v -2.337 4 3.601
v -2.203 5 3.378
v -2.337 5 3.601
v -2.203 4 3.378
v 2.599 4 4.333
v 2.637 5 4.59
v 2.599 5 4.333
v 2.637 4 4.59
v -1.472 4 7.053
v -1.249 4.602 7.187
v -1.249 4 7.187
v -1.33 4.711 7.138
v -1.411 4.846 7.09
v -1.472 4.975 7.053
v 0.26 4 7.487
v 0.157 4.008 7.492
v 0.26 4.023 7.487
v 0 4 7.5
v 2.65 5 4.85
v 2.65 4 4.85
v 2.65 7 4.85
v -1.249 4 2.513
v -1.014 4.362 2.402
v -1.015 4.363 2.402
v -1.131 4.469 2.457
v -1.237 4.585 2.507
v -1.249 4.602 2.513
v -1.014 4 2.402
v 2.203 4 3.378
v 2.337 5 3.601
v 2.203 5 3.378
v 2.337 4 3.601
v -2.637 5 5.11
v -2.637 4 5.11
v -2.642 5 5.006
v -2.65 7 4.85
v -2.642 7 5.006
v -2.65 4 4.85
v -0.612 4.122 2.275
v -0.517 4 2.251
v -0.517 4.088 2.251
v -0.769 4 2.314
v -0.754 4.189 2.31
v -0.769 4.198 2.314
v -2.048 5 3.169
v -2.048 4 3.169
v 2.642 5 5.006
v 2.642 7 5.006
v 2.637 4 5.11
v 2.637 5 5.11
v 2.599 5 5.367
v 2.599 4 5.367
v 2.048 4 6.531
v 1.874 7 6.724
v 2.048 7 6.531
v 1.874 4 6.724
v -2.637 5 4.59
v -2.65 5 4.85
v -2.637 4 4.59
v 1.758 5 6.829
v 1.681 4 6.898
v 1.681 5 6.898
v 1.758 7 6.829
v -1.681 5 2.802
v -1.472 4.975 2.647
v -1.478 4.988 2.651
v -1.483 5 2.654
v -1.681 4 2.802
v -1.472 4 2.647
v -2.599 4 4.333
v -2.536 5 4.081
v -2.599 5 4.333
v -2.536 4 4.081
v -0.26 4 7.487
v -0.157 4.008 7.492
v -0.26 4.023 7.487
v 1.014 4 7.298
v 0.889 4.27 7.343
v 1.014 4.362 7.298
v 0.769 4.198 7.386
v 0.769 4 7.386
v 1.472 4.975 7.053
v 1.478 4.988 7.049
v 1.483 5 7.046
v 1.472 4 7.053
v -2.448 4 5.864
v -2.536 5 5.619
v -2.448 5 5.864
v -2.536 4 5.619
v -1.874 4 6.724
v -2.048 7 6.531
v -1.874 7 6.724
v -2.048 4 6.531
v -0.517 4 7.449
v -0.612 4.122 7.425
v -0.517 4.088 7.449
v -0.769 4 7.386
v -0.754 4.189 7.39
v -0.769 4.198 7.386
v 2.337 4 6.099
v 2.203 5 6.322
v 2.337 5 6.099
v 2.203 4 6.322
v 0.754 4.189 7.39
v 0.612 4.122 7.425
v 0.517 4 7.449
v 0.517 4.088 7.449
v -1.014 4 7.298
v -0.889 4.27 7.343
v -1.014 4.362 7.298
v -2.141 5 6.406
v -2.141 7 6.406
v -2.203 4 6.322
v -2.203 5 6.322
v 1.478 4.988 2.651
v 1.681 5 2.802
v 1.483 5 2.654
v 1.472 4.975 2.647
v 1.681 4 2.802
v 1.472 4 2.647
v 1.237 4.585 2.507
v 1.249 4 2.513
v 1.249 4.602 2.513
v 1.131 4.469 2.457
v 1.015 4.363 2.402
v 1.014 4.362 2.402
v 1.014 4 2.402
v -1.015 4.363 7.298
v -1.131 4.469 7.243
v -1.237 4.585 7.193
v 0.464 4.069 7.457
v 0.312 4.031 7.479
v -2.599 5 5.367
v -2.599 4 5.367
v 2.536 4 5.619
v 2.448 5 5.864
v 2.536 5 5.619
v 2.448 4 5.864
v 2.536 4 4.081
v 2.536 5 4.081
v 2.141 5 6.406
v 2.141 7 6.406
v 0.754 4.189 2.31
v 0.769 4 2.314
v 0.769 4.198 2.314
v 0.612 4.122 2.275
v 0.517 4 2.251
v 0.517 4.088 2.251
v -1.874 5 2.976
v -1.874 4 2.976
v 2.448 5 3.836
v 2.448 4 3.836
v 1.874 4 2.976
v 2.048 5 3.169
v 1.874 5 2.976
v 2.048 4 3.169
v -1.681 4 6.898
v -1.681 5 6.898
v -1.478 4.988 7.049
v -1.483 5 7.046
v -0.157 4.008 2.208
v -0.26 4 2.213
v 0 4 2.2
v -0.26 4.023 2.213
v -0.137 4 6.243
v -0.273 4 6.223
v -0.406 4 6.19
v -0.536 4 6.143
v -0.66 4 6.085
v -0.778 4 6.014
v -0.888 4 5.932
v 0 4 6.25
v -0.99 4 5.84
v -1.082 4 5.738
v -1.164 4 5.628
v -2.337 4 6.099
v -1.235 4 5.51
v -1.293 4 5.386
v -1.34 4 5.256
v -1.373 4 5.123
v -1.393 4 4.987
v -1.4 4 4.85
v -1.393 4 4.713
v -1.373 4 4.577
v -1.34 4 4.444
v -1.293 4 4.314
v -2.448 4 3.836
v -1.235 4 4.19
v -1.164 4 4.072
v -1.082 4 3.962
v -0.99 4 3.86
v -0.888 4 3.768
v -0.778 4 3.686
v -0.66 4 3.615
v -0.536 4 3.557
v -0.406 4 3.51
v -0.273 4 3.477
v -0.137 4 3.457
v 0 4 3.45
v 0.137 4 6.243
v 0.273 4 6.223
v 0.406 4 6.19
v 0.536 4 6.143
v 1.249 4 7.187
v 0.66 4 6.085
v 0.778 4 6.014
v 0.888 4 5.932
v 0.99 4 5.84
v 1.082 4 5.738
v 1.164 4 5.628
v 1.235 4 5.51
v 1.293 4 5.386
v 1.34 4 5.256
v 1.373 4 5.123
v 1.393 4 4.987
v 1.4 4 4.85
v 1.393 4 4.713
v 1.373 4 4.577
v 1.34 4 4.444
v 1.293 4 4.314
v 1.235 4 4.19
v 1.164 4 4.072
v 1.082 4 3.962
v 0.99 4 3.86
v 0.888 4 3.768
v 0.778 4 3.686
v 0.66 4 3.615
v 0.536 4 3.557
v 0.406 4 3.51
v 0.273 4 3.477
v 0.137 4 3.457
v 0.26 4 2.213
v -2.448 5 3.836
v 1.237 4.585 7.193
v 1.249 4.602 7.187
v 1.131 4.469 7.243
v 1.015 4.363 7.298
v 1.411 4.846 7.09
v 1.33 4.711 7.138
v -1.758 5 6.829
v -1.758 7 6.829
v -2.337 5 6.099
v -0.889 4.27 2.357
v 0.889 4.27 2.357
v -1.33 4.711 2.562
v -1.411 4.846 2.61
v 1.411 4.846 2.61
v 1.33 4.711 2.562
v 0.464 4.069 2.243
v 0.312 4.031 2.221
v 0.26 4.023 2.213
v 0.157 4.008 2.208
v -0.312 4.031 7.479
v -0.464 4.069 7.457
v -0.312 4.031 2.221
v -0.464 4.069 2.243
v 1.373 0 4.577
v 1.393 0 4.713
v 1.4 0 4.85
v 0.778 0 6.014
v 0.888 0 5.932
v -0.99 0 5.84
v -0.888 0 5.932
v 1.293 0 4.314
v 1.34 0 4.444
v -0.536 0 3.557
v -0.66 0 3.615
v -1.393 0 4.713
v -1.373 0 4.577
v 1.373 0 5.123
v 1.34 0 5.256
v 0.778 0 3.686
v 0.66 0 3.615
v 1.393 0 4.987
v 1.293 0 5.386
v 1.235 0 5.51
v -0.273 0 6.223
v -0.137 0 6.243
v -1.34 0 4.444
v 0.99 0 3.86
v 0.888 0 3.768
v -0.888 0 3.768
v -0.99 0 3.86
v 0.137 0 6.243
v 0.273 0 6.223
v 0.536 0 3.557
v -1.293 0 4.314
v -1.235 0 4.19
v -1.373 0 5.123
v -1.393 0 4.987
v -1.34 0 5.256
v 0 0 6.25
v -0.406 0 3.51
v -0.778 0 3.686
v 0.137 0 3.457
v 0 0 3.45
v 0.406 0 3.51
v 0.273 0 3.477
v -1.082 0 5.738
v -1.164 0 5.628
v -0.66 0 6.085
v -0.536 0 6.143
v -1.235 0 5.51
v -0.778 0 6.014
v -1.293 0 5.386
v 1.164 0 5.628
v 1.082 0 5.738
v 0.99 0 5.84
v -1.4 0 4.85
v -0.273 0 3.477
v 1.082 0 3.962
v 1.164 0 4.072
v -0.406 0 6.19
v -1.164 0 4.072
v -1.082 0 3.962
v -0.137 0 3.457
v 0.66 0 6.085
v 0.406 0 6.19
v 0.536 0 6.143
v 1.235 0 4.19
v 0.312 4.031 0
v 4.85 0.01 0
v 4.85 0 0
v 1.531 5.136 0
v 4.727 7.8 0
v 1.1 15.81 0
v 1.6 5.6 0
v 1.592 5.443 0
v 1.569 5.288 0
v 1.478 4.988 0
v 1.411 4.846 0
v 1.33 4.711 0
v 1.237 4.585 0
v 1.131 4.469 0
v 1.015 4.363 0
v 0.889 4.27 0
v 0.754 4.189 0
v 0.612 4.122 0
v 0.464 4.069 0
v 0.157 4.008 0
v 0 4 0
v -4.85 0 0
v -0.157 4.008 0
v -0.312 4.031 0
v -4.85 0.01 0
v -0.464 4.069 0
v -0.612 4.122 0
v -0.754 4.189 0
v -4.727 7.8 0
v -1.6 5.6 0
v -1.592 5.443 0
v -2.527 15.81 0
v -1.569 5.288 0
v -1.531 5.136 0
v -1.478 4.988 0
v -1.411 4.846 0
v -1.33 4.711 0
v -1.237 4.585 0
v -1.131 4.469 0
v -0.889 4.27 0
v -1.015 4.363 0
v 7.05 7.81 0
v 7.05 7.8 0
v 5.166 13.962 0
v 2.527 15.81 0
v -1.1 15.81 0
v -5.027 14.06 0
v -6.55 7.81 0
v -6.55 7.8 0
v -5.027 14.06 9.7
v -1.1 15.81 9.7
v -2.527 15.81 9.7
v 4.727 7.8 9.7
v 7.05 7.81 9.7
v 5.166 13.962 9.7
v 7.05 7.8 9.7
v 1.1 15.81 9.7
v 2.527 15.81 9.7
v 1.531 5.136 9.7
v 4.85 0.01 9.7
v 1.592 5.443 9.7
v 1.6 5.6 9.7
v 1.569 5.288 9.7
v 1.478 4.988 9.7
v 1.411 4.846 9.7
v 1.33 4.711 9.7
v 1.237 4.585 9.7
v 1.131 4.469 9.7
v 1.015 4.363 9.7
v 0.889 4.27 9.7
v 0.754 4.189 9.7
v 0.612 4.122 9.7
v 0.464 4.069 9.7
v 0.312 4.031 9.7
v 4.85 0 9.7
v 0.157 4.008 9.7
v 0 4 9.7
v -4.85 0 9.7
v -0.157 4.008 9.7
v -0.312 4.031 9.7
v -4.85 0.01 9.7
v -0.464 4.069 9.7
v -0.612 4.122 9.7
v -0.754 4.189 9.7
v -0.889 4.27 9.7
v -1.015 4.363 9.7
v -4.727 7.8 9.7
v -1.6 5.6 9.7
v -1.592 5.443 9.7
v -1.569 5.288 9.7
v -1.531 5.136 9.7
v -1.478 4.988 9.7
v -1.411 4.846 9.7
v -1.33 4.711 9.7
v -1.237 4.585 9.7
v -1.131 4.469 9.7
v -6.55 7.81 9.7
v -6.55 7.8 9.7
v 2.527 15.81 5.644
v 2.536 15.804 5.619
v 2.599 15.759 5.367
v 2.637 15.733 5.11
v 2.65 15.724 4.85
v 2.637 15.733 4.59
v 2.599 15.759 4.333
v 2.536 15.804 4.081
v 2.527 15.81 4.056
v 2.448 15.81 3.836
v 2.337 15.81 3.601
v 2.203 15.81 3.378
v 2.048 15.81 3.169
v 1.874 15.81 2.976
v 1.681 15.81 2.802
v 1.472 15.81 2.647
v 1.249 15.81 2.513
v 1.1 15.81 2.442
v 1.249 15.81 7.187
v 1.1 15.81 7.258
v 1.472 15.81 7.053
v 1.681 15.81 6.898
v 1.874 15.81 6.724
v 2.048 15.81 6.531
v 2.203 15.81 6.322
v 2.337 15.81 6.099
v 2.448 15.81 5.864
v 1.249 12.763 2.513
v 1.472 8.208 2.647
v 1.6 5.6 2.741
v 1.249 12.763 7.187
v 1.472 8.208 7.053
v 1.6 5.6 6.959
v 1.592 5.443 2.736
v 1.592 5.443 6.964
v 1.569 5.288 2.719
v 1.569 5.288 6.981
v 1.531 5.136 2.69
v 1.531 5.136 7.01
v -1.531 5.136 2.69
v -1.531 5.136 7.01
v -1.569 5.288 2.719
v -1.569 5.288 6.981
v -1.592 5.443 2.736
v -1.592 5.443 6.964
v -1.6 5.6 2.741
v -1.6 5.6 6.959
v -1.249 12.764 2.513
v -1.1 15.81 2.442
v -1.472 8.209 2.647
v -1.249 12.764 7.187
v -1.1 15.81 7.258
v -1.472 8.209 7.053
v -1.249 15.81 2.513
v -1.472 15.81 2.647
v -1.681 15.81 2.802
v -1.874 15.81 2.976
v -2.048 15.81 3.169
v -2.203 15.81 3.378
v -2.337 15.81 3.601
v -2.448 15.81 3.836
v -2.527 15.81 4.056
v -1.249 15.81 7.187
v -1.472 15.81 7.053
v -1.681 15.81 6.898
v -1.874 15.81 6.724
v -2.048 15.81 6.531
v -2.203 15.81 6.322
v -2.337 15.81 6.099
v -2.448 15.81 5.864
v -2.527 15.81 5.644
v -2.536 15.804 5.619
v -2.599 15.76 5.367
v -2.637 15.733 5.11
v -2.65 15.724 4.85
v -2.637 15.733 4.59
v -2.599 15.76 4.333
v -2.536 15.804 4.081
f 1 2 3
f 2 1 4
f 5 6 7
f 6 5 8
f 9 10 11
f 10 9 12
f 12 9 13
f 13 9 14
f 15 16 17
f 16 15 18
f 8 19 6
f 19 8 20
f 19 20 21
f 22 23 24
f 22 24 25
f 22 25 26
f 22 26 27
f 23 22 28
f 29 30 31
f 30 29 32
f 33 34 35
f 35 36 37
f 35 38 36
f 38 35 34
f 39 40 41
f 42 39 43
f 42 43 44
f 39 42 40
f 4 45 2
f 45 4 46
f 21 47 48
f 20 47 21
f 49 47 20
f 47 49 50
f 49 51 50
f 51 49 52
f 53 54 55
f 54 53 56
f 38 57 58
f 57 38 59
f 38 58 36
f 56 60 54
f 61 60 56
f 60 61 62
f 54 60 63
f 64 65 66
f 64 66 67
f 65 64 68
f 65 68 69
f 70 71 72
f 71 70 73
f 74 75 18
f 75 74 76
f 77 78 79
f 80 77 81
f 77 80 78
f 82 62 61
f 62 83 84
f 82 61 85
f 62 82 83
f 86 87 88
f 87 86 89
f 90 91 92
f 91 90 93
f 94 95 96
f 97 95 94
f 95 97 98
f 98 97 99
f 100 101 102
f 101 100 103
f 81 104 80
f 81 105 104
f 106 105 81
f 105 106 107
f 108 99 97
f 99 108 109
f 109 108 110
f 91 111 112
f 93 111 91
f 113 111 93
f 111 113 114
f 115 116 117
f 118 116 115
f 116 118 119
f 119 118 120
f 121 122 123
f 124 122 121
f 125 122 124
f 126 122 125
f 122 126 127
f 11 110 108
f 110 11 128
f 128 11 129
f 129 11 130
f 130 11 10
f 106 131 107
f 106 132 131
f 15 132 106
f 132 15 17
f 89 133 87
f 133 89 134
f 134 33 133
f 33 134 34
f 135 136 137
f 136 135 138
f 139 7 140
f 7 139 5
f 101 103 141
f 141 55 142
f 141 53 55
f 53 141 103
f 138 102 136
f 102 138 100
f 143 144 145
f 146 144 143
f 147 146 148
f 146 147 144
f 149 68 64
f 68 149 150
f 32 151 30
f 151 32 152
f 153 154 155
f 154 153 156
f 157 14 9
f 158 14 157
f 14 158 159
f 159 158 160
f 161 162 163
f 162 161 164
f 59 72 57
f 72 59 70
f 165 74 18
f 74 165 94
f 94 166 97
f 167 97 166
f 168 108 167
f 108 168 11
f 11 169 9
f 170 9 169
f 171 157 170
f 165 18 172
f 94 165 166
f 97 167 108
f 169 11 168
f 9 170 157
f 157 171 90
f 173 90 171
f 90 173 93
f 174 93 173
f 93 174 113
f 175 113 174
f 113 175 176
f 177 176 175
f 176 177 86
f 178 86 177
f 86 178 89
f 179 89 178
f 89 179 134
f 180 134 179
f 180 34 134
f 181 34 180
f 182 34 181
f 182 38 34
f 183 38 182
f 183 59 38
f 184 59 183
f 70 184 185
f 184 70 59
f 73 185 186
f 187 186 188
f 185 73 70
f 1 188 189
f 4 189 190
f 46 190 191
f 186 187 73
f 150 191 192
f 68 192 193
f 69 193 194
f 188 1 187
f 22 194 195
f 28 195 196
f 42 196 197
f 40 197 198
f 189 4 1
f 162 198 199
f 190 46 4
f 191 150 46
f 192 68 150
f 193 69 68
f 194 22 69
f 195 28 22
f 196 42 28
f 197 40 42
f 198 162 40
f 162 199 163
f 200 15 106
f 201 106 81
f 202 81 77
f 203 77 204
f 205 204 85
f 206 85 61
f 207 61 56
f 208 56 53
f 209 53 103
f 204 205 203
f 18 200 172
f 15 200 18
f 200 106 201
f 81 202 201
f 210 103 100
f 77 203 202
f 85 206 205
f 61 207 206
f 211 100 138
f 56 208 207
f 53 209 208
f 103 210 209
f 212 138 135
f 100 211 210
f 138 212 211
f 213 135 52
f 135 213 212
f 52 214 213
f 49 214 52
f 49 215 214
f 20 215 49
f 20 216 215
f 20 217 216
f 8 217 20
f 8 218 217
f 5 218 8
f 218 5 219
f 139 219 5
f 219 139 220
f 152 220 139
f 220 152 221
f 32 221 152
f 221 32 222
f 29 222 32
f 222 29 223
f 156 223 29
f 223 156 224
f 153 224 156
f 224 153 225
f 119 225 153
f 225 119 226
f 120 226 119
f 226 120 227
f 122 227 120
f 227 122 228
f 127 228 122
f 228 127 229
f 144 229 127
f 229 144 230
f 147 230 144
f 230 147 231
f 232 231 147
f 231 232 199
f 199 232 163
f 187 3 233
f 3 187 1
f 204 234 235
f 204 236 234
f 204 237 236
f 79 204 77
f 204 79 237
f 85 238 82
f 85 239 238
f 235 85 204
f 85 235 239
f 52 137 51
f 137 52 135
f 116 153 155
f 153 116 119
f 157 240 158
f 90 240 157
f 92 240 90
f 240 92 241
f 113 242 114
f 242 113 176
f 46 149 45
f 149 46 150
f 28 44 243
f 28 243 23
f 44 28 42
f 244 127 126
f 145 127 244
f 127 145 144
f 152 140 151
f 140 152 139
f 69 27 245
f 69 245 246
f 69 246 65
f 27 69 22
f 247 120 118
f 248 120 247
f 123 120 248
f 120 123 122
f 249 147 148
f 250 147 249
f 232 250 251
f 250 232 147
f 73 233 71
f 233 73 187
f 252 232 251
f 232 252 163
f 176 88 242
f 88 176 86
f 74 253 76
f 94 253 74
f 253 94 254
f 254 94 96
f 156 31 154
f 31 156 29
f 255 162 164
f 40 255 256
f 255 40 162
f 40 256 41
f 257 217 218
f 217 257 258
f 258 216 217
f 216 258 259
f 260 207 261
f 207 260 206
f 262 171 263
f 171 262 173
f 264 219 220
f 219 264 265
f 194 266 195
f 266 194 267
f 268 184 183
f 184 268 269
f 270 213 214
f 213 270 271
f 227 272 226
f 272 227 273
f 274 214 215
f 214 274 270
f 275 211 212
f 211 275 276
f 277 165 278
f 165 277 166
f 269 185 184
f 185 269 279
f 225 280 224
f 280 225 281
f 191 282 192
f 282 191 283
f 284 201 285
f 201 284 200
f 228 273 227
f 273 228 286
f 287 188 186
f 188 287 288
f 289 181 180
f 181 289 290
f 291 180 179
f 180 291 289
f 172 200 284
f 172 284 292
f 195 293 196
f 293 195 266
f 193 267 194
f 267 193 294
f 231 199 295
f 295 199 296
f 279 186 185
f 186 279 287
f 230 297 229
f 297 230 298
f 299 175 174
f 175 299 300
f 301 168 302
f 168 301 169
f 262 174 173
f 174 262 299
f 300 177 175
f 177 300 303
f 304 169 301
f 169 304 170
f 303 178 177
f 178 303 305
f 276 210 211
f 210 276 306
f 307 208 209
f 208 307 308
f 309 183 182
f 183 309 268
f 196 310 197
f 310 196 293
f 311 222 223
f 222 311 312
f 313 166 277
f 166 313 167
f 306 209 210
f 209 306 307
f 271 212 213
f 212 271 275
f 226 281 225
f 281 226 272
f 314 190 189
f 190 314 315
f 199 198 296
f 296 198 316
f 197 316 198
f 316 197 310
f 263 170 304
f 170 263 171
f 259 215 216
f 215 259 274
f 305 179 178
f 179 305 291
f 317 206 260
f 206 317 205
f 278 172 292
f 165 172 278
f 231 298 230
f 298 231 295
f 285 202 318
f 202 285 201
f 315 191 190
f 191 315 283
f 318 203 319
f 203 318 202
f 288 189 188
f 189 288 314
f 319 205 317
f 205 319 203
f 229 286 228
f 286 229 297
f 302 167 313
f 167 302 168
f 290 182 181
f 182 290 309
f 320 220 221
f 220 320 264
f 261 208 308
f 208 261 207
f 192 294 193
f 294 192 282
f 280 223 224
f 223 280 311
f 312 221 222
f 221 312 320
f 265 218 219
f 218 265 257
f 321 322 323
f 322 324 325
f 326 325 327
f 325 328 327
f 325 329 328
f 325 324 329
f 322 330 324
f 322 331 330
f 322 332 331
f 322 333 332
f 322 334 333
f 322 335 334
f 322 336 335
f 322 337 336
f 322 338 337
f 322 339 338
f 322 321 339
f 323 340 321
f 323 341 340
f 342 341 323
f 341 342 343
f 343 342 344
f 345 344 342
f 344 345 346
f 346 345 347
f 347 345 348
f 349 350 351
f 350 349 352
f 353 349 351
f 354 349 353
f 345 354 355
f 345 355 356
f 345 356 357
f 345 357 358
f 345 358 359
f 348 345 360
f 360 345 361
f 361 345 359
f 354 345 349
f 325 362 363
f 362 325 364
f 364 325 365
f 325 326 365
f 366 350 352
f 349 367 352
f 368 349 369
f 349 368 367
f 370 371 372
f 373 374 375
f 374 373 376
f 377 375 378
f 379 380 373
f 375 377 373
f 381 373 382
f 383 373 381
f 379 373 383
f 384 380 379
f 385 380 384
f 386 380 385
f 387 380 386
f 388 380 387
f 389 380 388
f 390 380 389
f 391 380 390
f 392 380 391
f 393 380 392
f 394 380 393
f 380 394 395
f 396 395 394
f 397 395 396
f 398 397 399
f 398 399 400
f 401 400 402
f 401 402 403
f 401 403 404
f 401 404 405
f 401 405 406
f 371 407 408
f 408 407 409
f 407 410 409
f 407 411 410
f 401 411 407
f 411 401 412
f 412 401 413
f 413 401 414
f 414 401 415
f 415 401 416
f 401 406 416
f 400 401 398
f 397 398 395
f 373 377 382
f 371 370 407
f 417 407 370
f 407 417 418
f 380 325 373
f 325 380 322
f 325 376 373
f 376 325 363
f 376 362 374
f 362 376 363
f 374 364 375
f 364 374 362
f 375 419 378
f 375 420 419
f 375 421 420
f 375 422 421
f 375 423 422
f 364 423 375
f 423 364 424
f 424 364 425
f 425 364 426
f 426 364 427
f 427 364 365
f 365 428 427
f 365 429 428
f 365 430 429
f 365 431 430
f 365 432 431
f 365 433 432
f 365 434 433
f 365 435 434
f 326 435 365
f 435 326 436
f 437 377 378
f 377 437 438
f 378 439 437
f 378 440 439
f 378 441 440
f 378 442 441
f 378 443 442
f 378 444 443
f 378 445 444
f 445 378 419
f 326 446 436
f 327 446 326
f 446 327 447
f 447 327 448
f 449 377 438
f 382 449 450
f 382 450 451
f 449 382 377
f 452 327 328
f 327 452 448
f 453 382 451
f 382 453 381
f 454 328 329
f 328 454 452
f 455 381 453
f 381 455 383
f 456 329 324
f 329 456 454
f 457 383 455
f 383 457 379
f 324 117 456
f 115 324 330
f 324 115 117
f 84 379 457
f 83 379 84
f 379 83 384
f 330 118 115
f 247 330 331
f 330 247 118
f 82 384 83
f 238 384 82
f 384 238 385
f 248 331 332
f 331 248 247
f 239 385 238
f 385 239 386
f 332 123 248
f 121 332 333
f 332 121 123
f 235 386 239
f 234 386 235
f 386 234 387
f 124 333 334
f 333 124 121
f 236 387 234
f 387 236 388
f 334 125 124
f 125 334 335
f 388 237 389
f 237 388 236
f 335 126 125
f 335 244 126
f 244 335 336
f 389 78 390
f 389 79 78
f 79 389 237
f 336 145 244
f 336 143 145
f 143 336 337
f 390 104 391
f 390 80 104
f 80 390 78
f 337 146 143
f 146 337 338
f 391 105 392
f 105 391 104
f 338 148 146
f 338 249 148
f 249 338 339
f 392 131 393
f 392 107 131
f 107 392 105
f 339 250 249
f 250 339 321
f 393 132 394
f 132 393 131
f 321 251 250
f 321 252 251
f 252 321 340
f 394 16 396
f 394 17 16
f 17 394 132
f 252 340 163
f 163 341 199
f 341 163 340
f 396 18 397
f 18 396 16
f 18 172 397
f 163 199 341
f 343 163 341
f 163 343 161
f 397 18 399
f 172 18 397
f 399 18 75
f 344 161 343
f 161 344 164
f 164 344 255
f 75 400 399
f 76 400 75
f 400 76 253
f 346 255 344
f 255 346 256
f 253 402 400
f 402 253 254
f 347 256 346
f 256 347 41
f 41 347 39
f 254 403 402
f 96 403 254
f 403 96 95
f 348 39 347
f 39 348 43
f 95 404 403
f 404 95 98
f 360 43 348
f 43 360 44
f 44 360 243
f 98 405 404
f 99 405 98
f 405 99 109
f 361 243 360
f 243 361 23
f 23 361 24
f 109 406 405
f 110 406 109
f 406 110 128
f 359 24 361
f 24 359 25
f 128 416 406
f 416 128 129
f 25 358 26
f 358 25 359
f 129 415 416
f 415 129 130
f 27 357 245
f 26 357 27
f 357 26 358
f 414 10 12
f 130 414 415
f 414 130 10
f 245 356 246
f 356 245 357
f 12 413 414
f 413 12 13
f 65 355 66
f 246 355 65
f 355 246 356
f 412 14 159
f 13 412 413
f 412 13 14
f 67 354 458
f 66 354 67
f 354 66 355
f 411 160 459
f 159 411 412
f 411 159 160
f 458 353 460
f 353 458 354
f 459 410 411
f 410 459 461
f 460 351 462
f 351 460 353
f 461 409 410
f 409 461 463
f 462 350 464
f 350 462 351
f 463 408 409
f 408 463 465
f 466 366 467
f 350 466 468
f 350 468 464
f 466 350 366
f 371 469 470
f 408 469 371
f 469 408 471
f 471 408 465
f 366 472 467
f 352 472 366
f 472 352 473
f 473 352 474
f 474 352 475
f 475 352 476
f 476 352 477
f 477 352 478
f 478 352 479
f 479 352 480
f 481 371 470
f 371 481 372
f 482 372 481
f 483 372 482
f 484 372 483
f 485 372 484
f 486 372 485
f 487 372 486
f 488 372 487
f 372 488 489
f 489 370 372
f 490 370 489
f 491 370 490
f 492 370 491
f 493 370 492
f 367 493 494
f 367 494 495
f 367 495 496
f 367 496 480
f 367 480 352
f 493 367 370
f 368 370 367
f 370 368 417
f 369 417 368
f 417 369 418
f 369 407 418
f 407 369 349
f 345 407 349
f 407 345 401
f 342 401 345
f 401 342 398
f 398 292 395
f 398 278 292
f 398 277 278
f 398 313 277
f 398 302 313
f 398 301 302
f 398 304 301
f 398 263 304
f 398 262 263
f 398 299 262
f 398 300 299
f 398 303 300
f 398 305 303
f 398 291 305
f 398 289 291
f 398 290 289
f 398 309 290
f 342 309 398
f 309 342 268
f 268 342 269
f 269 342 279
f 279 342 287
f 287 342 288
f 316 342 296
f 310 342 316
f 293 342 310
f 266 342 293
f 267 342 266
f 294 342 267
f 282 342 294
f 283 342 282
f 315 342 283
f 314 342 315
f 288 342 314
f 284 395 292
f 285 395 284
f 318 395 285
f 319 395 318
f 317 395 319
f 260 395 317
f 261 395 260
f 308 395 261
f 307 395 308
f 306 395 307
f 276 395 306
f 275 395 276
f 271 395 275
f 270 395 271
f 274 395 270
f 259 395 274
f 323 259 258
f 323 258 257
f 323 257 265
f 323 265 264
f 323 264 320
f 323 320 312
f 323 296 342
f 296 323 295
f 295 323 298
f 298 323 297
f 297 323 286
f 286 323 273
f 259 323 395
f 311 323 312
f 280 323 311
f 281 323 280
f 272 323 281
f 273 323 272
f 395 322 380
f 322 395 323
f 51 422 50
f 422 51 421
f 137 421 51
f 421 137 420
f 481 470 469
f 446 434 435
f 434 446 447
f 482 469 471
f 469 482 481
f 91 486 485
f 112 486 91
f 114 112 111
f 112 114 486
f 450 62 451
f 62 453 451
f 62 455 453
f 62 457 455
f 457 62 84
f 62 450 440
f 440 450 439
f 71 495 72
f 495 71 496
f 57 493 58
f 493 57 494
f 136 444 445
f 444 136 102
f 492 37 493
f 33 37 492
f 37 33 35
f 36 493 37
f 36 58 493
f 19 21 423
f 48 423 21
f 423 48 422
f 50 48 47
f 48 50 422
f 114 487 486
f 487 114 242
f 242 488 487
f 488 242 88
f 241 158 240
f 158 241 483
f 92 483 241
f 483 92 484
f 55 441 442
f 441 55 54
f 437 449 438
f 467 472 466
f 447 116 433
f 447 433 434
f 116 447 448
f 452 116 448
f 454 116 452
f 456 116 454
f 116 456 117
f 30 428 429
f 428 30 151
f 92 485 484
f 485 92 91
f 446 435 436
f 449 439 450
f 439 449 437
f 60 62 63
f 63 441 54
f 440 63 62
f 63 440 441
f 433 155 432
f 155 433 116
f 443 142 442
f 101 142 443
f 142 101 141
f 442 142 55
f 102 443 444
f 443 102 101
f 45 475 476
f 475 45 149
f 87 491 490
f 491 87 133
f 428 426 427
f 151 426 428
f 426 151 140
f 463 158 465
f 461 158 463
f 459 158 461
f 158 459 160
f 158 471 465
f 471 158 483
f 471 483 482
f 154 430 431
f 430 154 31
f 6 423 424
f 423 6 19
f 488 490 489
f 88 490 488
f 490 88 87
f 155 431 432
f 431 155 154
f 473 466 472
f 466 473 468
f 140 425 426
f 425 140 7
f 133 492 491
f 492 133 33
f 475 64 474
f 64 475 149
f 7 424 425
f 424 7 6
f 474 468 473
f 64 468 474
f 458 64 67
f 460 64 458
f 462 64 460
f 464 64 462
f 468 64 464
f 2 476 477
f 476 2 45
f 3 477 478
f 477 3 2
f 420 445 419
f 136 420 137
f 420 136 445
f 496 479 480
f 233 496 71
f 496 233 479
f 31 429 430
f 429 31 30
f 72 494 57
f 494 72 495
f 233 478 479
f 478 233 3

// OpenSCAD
// Missing Tent Clip Replacement
$fn = 64;

// Base of clip (attaching to rod)
stock_dia = 18.0;
stock_rad = stock_dia/2;
stock_len = 35.0;
stock_to_pole_thick = 4.0;

// Clip
fork_len = 15.8;
fork_gap_base_dist = 4.0;
fork_gap_len = fork_len - fork_gap_base_dist;
barb_dist = 2.2;
barb_len = 8.0;
tip_shave_angle = 35;
fork_tip_w = 3.5;
fork_tip_h = 9.7;
forks_w = 9.7;
prong_w = 3.3;
forks_dist_base = 3.2;
forks_dist_tip = 2.2;
forks_tip_w = fork_tip_w*2 + forks_dist_tip;

// The clip without the gap for the forks
module solid_clip_2d() {
    hull () {
        square([forks_w, 0.01]);
        translate([(forks_w-forks_tip_w)/2,fork_len])
        square([forks_tip_w, 0.01]);
    }
}

module solid_clip_with_barbs_2d() {
    union() {
        solid_clip_2d();
        hull() {
            translate([(forks_w-forks_tip_w)/2,fork_len])
            square([forks_tip_w,0.01]);
            translate([-barb_dist+(forks_w-forks_tip_w),fork_len-barb_len])
            square([2*barb_dist+forks_tip_w,0.01]);
        }
    }
}

module forks_gap_2d() {
    hull () {
        translate([forks_w/2,fork_gap_base_dist+forks_dist_base/2])
        circle(forks_dist_base/2);
        translate([forks_w/2-forks_dist_tip/2,fork_len])
        square([forks_dist_tip, 0.01]);
    }
}

module forks_with_gap_2d() {
    difference() {
        solid_clip_with_barbs_2d();    
        forks_gap_2d();
    }
}

module forks_with_shaved_barbs() {
    difference() {
        forks_with_gap_2d();
        translate([(forks_w-forks_tip_w)/2,fork_len+1])
        rotate([0,0,tip_shave_angle])
        square([8.0, 4.0], true);
        translate([forks_tip_w,0])
        translate([(forks_w-forks_tip_w)/2,fork_len+1])
        rotate([0,0,-tip_shave_angle])
        square([8.0, 4.0], true);
    }
}

module forks_3d() {
    translate([-forks_w/2,0,0])
    linear_extrude(fork_tip_h)
    forks_with_shaved_barbs();
}


m3_shaft_len = 10.0;
m3_shaft_dia = 2.8;
m3_head_dia = 5.3;
m3_head_len = 3.0;
module m3_screw() {
    translate([0,0,m3_shaft_len+m3_head_len])
    rotate([180,0,0])
    union() {
    translate([0,0,m3_shaft_len])
    linear_extrude(m3_head_len)
    circle(m3_head_dia/2);
    linear_extrude(m3_shaft_len)
    circle(m3_shaft_dia/2);
    }
}

module m3_head_placed() {
    translate([0,m3_shaft_len/2,fork_tip_h/2])
    rotate([270,0,0])
    union() {
    linear_extrude(m3_head_len)
    circle(m3_head_dia/2);
    }
}

module m3_screw_placed() {
    translate([0,fork_gap_base_dist+m3_head_len,fork_tip_h/2])
    rotate([90,0,0])
    m3_screw();
}

difference() {
forks_3d();
m3_screw_placed();
hull() {
    m3_head_placed();
    translate([0,10,0])
    m3_head_placed();
}
}
